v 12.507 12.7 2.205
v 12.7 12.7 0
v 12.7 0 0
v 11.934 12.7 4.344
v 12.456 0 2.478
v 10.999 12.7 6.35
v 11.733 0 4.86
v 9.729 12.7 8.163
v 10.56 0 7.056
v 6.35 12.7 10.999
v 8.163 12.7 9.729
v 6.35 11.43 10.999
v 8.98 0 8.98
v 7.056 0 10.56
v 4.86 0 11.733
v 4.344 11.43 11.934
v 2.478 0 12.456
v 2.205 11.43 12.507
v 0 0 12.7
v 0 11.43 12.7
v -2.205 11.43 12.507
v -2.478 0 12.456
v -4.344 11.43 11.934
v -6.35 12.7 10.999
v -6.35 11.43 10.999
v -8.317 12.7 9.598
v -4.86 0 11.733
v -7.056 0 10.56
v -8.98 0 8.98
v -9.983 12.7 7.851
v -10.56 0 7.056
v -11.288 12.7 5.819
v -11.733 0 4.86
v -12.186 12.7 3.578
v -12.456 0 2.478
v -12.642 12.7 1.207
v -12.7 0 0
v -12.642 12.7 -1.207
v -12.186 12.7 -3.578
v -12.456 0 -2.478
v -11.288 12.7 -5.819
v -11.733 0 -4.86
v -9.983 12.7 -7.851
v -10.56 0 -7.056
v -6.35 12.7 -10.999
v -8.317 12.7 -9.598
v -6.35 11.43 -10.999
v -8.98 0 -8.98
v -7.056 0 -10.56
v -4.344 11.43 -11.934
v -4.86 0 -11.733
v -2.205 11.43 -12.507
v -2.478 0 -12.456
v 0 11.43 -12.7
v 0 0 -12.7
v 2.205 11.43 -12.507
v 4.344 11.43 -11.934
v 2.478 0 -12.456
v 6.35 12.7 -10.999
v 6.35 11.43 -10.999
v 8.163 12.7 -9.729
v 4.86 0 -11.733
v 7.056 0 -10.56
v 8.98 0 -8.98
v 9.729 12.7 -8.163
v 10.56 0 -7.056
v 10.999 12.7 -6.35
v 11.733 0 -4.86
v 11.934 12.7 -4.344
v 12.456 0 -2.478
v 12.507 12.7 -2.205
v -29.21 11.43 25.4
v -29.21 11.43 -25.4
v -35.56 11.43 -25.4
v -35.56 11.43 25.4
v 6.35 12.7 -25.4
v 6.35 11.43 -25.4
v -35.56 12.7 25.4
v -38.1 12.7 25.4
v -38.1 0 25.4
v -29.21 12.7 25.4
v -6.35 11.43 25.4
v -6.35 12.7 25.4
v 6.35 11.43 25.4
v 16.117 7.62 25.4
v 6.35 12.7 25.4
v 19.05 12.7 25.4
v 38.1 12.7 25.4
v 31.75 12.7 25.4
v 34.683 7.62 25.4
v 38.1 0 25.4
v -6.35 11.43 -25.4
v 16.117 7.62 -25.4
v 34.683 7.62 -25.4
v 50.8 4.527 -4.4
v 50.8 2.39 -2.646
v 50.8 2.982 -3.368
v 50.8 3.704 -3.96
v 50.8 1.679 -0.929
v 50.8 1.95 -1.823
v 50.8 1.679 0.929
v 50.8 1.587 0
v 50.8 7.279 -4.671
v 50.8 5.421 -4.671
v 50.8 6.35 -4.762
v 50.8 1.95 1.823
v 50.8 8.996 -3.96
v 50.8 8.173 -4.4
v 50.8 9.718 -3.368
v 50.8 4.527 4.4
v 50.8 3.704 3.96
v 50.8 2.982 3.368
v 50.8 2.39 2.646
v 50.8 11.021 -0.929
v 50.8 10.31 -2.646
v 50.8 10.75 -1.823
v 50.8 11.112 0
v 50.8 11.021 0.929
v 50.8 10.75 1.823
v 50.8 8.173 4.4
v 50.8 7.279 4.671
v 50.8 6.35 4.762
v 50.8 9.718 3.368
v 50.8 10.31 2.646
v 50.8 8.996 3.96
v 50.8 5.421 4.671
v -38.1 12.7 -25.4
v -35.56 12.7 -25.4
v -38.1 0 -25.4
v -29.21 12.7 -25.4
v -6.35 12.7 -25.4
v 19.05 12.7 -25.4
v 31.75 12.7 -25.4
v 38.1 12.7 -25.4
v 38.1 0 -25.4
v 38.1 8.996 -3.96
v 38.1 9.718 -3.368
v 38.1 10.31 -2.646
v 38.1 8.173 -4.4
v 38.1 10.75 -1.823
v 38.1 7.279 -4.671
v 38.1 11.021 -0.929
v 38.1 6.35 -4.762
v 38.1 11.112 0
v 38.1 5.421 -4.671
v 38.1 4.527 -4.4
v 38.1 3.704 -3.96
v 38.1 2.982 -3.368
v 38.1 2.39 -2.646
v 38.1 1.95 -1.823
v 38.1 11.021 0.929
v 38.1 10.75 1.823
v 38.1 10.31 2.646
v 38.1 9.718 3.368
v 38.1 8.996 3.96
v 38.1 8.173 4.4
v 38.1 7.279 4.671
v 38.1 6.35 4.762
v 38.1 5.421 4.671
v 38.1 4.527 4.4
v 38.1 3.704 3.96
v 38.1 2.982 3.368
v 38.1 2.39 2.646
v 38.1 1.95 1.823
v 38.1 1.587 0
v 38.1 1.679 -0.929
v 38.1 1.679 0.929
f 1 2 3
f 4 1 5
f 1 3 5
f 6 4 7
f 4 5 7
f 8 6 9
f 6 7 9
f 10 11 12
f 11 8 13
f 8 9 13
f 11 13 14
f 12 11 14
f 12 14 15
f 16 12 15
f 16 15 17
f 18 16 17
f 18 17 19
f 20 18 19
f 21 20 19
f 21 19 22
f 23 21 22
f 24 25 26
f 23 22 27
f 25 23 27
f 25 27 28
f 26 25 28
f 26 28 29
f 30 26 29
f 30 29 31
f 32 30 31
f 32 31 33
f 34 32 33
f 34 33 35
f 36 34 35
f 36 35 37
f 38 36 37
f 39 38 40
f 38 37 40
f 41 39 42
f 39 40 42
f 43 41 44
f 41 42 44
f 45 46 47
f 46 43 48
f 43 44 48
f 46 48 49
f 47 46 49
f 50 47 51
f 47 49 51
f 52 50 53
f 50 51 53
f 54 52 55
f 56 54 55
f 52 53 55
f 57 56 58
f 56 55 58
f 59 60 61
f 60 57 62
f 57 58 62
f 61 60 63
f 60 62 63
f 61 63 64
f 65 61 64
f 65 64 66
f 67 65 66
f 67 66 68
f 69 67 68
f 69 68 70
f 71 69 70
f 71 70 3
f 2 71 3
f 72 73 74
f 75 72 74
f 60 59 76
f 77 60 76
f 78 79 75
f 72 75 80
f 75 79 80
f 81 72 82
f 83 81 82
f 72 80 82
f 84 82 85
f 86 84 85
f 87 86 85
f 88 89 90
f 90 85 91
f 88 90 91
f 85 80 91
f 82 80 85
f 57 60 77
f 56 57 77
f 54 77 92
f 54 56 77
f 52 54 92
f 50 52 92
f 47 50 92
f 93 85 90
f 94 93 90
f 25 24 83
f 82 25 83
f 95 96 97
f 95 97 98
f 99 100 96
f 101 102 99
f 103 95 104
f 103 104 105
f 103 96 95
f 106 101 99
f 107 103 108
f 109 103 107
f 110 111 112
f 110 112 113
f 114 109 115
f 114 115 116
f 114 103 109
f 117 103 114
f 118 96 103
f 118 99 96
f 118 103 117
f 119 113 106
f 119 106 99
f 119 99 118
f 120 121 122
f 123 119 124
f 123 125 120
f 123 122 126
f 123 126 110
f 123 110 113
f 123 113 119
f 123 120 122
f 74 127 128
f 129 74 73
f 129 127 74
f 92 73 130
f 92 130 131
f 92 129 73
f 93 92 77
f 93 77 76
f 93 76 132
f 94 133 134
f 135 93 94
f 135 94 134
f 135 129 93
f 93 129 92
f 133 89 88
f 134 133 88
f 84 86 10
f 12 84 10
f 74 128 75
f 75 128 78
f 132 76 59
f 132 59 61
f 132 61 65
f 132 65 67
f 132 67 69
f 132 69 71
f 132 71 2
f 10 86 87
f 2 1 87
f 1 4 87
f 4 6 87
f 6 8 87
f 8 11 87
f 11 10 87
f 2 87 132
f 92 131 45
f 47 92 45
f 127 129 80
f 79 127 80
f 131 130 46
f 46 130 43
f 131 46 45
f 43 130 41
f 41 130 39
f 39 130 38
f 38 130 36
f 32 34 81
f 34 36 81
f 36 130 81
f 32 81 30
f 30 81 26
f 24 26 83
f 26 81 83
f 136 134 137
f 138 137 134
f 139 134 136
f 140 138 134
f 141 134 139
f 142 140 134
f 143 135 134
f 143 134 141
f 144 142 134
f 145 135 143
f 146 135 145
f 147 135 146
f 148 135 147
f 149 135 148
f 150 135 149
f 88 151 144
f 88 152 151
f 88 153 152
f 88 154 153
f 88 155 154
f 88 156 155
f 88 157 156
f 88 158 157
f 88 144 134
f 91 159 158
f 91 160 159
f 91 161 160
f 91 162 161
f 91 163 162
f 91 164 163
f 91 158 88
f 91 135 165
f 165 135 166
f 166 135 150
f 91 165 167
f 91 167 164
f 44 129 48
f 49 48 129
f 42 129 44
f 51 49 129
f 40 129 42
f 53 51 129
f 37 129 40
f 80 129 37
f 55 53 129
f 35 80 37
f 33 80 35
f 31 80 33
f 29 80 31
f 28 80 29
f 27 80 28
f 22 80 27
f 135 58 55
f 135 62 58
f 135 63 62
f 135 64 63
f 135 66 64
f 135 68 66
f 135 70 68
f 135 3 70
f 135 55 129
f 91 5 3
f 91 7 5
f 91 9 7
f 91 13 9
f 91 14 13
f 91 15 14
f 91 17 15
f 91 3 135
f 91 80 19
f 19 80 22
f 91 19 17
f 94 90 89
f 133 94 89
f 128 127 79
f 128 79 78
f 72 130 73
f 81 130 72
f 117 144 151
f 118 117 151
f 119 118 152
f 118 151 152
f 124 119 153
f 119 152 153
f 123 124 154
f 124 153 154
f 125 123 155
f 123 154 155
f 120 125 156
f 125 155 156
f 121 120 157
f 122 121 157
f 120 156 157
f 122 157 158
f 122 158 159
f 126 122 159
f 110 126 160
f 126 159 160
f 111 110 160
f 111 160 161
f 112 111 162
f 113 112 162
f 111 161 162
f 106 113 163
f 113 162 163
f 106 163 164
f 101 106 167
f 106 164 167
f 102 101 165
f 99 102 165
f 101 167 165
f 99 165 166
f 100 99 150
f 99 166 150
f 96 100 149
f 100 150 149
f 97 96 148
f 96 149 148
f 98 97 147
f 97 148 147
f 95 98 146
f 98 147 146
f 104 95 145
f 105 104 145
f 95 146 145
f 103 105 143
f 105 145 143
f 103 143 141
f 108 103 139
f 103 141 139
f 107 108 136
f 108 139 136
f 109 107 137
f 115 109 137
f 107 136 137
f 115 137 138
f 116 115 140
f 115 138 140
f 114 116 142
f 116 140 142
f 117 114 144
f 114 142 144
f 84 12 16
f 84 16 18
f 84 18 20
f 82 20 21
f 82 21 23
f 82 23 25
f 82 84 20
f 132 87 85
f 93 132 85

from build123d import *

# Parameters (mm, degrees)
F0_W     = 76.2
F0_H     = 50.8
F0_R     = 12.7
F1_DEPTH = 12.7
F2_W     = 6.35
F2_H     = 50.8
F3_DEPTH = 1.27
F5_DEPTH = 50.801
F6_R     = 4.7625
F7_DEPTH = 12.7


with BuildPart() as f1:
    # F0 (on Front) → F1 (new body)
    with BuildSketch(Plane.XZ):
        Rectangle(F0_W, F0_H)
        Circle(F0_R, mode=Mode.SUBTRACT)
    extrude(amount=-F1_DEPTH)

    # F2 (on face) → F3 (cut)
    with BuildSketch(Plane(origin=(0, 12.7, 0), x_dir=(-1, 0, 0), z_dir=(0, 1, 0))):
        with Locations((32.385, 0)):
            Rectangle(F2_W, F2_H)
        with BuildLine():
            Line((6.35, 10.9985226281), (6.35, 25.4))
            Line((6.35, 25.4), (-6.35, 25.4))
            Line((-6.35, 25.4), (-6.35, 10.9985226281))
            ThreePointArc((-6.35, 10.9985226281), (0, 12.7), (6.35, 10.9985226281))
        make_face()
        with BuildLine():
            Line((-6.35, -25.4), (6.35, -25.4))
            Line((6.35, -25.4), (6.35, -10.9985226281))
            ThreePointArc((6.35, -10.9985226281), (0, -12.7), (-6.35, -10.9985226281))
            Line((-6.35, -10.9985226281), (-6.35, -25.4))
        make_face()
    extrude(amount=-F3_DEPTH, mode=Mode.SUBTRACT)

    # F4 (on face) → F5 (cut, through all)
    with BuildSketch(Plane.XY.offset(25.4)):
        Polygon((31.75, 12.7), (19.05, 12.7), (16.1170606325, 7.62), (34.6829393675, 7.62), align=None)
    extrude(amount=-F5_DEPTH, mode=Mode.SUBTRACT)

    # F6 (on face) → F7 (join)
    with BuildSketch(Plane.YZ.offset(38.1)):
        with Locations((6.35, 0)):
            Circle(F6_R)
    extrude(amount=F7_DEPTH)


solid = f1.part
